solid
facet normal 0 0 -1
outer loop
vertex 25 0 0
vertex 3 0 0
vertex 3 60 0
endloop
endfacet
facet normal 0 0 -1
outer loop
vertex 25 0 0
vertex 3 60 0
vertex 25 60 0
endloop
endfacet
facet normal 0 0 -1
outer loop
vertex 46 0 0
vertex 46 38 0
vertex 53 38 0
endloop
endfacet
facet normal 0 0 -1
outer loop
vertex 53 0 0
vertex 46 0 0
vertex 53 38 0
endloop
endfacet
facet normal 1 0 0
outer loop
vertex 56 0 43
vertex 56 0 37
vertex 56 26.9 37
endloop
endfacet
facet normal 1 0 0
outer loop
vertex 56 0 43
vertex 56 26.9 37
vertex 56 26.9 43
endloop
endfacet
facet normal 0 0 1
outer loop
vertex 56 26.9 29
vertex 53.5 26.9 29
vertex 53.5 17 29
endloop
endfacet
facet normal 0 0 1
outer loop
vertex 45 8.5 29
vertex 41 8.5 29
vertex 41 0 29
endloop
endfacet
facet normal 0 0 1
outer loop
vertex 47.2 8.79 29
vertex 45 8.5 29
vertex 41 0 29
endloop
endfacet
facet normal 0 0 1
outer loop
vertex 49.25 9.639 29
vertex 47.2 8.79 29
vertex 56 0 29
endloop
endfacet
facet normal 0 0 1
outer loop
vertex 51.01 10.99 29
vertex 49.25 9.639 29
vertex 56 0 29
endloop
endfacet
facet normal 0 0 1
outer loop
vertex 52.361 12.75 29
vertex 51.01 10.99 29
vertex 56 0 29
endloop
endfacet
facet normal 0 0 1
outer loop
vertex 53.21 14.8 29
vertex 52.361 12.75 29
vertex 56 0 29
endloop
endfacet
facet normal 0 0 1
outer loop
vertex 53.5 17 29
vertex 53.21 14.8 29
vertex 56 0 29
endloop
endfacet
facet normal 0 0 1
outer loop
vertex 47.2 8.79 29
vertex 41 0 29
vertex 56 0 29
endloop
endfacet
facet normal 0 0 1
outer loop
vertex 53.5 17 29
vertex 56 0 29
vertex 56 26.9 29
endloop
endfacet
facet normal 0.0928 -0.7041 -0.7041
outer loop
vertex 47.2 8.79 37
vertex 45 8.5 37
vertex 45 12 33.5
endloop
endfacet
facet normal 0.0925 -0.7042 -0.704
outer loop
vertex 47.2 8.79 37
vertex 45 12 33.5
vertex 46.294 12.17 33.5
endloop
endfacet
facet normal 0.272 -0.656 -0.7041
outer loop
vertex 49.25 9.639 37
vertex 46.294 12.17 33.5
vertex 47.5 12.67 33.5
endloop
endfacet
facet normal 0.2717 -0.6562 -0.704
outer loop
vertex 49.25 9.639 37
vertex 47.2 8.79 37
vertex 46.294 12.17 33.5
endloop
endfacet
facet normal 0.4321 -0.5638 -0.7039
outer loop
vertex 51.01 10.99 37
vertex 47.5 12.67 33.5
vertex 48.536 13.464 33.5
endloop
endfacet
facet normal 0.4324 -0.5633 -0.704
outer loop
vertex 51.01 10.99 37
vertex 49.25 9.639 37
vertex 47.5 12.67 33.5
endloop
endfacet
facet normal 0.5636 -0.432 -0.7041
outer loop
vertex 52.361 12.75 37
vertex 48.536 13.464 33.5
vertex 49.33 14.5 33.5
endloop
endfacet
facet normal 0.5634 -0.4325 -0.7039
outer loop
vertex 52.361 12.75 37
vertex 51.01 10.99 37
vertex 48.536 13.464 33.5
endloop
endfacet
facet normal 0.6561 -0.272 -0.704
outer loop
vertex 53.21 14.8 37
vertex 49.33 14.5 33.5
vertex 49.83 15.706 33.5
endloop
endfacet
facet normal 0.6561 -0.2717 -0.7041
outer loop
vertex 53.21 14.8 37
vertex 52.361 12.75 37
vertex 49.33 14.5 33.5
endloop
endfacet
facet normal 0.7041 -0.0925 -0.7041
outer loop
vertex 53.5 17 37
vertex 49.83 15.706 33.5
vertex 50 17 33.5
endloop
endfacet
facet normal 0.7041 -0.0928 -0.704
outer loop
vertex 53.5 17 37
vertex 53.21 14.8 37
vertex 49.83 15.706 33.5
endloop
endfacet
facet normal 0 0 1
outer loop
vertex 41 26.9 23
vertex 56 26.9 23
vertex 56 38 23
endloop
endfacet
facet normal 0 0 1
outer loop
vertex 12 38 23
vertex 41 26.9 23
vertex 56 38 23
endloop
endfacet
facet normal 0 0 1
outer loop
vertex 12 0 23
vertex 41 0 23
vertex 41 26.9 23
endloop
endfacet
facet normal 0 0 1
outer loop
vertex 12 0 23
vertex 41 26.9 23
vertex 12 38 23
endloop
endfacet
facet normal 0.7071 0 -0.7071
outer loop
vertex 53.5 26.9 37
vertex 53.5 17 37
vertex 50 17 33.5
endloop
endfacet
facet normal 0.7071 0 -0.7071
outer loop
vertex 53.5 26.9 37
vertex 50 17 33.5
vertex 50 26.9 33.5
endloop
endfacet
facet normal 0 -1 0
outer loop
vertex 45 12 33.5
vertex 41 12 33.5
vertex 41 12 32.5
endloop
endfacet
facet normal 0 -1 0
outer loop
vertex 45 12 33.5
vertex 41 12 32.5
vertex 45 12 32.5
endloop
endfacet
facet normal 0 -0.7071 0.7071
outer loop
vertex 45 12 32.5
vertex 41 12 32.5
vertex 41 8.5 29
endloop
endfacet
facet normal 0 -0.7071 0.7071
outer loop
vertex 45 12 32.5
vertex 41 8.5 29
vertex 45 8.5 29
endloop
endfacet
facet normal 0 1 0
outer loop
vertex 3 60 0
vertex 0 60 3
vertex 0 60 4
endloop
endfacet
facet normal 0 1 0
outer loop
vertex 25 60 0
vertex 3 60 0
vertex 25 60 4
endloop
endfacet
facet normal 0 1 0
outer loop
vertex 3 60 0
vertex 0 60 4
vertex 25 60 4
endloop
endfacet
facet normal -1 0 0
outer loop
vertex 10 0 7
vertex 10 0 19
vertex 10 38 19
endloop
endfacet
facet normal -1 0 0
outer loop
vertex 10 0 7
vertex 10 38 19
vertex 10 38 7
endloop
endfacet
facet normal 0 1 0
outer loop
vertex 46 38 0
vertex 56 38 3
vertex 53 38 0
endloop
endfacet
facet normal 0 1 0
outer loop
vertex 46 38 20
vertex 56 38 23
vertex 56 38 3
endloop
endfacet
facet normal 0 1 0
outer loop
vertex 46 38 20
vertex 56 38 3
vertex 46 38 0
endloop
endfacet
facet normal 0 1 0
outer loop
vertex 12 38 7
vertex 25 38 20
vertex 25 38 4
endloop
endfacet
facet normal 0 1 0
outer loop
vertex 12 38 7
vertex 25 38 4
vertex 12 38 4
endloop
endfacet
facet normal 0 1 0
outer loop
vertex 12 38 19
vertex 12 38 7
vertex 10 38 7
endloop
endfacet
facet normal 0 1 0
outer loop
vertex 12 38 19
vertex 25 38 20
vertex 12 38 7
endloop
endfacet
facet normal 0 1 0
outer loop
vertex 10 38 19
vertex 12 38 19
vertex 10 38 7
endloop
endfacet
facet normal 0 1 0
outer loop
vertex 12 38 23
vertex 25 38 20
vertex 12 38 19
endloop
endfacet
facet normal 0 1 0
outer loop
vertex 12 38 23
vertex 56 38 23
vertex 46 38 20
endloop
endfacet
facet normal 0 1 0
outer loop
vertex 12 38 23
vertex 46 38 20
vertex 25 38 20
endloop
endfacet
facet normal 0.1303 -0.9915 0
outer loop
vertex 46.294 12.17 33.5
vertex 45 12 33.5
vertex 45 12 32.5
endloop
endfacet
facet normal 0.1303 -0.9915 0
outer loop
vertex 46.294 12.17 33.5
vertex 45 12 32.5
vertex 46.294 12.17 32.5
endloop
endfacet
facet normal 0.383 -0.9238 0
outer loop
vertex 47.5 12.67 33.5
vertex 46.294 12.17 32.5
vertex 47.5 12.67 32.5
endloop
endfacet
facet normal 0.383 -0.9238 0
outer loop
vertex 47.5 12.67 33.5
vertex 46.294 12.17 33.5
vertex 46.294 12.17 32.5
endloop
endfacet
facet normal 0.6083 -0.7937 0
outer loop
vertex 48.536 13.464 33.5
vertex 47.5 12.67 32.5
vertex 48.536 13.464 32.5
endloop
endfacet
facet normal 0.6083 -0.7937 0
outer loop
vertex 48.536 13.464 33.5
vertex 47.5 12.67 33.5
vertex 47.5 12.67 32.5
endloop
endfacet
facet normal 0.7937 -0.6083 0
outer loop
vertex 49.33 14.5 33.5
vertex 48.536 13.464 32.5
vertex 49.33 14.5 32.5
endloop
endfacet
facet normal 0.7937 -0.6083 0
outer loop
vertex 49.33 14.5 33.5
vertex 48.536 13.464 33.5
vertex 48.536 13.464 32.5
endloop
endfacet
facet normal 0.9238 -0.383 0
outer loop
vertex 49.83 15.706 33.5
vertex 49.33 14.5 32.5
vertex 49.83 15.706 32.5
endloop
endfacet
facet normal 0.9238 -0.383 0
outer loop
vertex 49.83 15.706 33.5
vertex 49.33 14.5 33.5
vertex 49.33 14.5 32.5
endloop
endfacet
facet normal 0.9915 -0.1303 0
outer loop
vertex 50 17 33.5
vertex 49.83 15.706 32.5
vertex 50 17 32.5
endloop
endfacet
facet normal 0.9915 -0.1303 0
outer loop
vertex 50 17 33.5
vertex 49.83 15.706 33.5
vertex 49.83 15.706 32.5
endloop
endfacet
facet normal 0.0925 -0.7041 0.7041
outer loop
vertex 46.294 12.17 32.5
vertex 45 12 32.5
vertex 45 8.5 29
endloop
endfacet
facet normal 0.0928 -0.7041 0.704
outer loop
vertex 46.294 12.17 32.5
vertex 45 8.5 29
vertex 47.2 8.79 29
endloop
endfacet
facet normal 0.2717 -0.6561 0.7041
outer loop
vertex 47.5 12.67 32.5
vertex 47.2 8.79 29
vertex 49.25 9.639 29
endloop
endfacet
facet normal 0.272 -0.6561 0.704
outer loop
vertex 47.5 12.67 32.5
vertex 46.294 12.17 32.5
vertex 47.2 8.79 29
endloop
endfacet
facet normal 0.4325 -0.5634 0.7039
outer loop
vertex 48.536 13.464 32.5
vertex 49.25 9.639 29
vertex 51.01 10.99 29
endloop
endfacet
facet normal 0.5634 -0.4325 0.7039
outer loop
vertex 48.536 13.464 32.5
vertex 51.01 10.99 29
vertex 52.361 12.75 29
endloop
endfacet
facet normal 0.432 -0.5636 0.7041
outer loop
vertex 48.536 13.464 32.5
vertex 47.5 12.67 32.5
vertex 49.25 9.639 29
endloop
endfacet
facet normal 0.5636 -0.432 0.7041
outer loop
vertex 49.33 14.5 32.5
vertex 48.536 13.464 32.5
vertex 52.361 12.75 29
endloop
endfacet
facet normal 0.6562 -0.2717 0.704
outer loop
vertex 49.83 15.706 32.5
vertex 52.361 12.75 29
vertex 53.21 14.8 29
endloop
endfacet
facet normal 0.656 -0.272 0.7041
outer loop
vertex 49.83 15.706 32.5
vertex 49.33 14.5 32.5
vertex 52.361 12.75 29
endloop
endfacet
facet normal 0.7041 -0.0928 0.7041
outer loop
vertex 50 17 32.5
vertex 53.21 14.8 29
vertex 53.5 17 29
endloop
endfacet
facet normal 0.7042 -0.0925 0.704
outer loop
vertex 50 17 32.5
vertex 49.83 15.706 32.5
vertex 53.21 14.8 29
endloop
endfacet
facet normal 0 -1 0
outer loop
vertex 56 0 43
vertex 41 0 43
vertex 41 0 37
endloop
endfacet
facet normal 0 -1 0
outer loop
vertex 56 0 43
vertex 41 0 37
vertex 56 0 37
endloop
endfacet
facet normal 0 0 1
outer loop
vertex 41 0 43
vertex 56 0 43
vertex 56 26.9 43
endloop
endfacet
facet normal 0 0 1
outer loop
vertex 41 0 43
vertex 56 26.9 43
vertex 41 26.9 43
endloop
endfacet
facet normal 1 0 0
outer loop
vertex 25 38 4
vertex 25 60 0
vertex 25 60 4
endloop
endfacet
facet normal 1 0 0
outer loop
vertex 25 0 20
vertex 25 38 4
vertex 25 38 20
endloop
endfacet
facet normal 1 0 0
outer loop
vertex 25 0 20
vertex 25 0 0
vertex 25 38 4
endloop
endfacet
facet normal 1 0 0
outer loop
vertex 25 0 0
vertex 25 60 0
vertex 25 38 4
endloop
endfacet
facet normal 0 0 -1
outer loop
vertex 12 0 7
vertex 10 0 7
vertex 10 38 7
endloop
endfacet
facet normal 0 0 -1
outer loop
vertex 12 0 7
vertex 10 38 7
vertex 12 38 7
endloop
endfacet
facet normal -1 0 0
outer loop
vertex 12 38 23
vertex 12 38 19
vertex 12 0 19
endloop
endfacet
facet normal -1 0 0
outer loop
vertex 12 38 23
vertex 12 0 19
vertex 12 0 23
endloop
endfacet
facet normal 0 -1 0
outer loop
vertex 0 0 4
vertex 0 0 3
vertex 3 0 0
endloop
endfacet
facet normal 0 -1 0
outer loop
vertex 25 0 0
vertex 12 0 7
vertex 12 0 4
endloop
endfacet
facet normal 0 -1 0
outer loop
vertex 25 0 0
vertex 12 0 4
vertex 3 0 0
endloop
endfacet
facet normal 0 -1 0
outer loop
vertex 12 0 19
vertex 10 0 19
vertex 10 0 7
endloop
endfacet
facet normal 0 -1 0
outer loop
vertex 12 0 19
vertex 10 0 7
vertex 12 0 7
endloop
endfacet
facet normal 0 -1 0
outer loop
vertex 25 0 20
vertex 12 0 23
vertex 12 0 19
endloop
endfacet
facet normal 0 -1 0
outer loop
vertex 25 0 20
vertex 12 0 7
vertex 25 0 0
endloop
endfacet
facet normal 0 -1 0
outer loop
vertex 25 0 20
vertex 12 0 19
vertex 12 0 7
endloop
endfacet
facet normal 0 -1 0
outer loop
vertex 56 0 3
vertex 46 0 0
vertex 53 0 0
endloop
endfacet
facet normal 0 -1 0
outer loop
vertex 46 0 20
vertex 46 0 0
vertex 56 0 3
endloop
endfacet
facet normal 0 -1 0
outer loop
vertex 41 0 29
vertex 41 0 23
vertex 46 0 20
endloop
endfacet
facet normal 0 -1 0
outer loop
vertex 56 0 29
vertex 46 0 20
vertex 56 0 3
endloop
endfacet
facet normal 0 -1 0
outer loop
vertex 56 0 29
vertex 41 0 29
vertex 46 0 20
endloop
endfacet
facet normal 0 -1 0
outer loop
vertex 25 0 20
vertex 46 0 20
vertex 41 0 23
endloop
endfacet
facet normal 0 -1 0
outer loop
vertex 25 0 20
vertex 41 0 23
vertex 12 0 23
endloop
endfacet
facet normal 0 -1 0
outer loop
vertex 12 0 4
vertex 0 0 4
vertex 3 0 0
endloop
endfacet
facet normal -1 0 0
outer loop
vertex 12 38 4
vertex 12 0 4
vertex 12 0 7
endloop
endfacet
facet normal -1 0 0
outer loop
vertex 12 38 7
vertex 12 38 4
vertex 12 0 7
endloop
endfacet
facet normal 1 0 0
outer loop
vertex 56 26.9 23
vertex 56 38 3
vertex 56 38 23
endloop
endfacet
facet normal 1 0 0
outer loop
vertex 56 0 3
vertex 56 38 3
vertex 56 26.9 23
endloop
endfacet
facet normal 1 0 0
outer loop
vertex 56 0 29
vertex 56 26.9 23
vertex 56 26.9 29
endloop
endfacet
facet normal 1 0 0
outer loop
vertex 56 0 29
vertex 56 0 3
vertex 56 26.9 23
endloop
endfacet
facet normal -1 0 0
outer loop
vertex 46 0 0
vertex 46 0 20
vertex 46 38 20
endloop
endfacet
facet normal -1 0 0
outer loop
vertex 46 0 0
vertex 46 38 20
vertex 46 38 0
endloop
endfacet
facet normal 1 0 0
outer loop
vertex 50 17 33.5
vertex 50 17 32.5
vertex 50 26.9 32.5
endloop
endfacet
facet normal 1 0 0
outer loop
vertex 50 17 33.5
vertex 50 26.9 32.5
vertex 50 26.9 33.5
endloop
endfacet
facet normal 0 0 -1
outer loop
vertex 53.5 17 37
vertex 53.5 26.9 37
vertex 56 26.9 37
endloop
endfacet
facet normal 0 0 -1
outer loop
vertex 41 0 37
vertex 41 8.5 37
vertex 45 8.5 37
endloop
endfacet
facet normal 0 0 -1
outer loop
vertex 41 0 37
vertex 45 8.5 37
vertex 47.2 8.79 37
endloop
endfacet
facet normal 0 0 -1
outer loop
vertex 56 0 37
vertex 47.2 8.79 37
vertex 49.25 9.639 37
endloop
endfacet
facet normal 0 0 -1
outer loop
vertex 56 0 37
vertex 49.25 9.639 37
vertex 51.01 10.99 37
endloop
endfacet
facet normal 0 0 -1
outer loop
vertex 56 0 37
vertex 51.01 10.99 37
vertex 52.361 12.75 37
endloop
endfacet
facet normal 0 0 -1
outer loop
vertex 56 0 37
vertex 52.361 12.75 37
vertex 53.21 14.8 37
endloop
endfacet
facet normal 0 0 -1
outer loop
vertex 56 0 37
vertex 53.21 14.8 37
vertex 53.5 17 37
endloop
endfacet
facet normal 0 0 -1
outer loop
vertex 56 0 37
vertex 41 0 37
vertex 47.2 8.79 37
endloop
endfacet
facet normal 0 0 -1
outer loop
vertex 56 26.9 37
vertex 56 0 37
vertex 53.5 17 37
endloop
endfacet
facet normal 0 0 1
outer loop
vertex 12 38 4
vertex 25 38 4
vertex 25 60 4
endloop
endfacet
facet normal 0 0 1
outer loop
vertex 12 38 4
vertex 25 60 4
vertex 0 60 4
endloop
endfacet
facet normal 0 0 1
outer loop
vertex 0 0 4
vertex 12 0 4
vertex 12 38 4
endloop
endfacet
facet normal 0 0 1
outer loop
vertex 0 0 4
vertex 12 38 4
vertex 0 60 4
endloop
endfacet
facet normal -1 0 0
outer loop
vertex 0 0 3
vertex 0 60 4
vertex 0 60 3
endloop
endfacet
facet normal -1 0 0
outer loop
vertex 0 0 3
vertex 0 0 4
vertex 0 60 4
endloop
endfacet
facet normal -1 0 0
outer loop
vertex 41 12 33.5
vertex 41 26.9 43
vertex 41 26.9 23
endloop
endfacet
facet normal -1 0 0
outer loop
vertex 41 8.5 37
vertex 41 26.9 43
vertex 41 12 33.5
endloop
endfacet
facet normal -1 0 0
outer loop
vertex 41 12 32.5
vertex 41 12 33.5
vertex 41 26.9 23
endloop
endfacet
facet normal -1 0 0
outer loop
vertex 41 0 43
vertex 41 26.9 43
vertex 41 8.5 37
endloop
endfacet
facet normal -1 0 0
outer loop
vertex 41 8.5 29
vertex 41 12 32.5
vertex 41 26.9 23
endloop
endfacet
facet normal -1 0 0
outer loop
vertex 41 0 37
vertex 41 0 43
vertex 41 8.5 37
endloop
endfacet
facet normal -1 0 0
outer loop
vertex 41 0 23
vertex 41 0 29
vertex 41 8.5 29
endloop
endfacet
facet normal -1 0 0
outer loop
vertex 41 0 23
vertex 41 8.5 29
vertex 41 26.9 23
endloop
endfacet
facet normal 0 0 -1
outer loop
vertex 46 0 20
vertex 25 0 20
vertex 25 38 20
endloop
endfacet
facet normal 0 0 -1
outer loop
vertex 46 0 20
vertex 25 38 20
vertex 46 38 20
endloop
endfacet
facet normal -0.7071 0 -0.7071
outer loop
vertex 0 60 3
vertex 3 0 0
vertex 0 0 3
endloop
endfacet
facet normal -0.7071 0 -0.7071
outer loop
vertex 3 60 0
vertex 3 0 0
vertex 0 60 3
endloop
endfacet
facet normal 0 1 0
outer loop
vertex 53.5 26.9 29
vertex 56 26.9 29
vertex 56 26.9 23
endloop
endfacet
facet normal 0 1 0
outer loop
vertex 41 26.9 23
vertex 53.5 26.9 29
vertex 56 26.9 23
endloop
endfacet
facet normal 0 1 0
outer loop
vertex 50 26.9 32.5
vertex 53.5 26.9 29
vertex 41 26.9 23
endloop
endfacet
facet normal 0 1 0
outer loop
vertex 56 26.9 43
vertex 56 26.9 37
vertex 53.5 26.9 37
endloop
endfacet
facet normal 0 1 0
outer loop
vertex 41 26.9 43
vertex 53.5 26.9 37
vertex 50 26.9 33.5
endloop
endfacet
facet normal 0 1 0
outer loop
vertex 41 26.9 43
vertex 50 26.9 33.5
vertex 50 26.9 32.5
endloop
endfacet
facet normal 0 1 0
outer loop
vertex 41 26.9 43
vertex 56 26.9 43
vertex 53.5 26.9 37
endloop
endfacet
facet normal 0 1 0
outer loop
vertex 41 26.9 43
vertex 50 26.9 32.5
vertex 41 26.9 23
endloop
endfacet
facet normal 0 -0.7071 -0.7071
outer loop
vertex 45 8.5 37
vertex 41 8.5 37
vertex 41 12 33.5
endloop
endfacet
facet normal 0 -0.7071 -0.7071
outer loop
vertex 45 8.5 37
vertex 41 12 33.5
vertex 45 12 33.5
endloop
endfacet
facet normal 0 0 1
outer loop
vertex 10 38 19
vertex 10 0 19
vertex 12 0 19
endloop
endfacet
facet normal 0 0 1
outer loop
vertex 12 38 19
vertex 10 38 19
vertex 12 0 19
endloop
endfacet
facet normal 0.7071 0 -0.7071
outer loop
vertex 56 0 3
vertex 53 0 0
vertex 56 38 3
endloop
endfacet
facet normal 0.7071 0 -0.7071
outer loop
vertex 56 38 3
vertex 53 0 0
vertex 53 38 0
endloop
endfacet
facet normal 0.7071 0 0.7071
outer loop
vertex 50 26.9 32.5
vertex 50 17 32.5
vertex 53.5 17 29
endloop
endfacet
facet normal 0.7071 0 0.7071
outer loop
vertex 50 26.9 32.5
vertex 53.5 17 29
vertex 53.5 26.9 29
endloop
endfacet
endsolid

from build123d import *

# Parameters (mm, degrees)
F1_DEPTH  = 60
F2_W      = 100
F2_H      = 100
F3_DEPTH  = 22
F5_DEPTH  = 11.1
F6_W      = 15
F6_H      = 8
F7_DEPTH  = 12
F8_W      = 6
F8_H      = 8
F9_DEPTH  = 60.001
F10_W     = 2
F10_H     = 3
F10_H_2   = 4
F11_DEPTH = 60.001
F12_W     = 30
F12_H     = 15
F13_DEPTH = 22
F14_SIZE  = 3
F15_R     = 5
F16_SIZE  = 3.5


with BuildPart() as f1:
    # F0 (on Front) → F1 (new body)
    with BuildSketch(Plane.XZ):
        Polygon((0, 4), (0, 0), (25, 0), (25, 20), (46, 20), (46, 0), (56, 0), (56, 43), (41, 43), (41, 23), (10, 23), (10, 4), align=None)
    extrude(amount=-F1_DEPTH)

    # F2 (on face) → F3 (cut)
    with BuildSketch(Plane(origin=(0, 60, 0), x_dir=(-1, 0, 0), z_dir=(0, 1, 0))):
        with Locations((-50, 54)):
            Rectangle(F2_W, F2_H)
    extrude(amount=-F3_DEPTH, mode=Mode.SUBTRACT)

    # F4 (on face) → F5 (cut)
    with BuildSketch(Plane(origin=(0, 38, 0), x_dir=(-1, 0, 0), z_dir=(0, 1, 0))):
        Polygon((-110, 23), (-41, 23), (-10, 23), (-10, 123), (-110, 123), align=None)
    extrude(amount=-F5_DEPTH, mode=Mode.SUBTRACT)

    # F6 (on Front) → F7 (cut)
    with BuildSketch(Plane.XZ):
        with Locations((48.5, 33)):
            Rectangle(F6_W, F6_H)
    extrude(amount=-F7_DEPTH, mode=Mode.SUBTRACT)

    # F8 (on Front) → F9 (cut, through all)
    with BuildSketch(Plane.XZ):
        with Locations((53, 33)):
            Rectangle(F8_W, F8_H)
    extrude(amount=-F9_DEPTH, mode=Mode.SUBTRACT)

    # F10 (on Front) → F11 (cut, through all)
    with BuildSketch(Plane.XZ):
        with Locations((11, 5.5)):
            Rectangle(F10_W, F10_H)
        with Locations((11, 21)):
            Rectangle(F10_W, F10_H_2)
    extrude(amount=-F11_DEPTH, mode=Mode.SUBTRACT)

    # F12 (on face) → F13 (cut, through all)
    with BuildSketch(Plane(origin=(0, 60, 0), x_dir=(-1, 0, 0), z_dir=(0, 1, 0))):
        with Locations((-45, 7.5)):
            Rectangle(F12_W, F12_H)
    extrude(amount=-F13_DEPTH, mode=Mode.SUBTRACT)

    # F14
    f14_edges = [f1.edges().sort_by_distance(p)[0] for p in [
        (56, 19, 0),
        (0, 30, 0),
    ]]
    chamfer(f14_edges, length=F14_SIZE)

    # F15
    f15_edges = [f1.edges().sort_by_distance(p)[0] for p in [
        (50, 12, 33),
    ]]
    fillet(f15_edges, radius=F15_R)

    # F16
    f16_edges = [f1.edges().sort_by_distance(p)[0] for p in [
        (43, 12, 37),
        (43, 12, 29),
    ]]
    chamfer(f16_edges, length=F16_SIZE)


solid = f1.part
